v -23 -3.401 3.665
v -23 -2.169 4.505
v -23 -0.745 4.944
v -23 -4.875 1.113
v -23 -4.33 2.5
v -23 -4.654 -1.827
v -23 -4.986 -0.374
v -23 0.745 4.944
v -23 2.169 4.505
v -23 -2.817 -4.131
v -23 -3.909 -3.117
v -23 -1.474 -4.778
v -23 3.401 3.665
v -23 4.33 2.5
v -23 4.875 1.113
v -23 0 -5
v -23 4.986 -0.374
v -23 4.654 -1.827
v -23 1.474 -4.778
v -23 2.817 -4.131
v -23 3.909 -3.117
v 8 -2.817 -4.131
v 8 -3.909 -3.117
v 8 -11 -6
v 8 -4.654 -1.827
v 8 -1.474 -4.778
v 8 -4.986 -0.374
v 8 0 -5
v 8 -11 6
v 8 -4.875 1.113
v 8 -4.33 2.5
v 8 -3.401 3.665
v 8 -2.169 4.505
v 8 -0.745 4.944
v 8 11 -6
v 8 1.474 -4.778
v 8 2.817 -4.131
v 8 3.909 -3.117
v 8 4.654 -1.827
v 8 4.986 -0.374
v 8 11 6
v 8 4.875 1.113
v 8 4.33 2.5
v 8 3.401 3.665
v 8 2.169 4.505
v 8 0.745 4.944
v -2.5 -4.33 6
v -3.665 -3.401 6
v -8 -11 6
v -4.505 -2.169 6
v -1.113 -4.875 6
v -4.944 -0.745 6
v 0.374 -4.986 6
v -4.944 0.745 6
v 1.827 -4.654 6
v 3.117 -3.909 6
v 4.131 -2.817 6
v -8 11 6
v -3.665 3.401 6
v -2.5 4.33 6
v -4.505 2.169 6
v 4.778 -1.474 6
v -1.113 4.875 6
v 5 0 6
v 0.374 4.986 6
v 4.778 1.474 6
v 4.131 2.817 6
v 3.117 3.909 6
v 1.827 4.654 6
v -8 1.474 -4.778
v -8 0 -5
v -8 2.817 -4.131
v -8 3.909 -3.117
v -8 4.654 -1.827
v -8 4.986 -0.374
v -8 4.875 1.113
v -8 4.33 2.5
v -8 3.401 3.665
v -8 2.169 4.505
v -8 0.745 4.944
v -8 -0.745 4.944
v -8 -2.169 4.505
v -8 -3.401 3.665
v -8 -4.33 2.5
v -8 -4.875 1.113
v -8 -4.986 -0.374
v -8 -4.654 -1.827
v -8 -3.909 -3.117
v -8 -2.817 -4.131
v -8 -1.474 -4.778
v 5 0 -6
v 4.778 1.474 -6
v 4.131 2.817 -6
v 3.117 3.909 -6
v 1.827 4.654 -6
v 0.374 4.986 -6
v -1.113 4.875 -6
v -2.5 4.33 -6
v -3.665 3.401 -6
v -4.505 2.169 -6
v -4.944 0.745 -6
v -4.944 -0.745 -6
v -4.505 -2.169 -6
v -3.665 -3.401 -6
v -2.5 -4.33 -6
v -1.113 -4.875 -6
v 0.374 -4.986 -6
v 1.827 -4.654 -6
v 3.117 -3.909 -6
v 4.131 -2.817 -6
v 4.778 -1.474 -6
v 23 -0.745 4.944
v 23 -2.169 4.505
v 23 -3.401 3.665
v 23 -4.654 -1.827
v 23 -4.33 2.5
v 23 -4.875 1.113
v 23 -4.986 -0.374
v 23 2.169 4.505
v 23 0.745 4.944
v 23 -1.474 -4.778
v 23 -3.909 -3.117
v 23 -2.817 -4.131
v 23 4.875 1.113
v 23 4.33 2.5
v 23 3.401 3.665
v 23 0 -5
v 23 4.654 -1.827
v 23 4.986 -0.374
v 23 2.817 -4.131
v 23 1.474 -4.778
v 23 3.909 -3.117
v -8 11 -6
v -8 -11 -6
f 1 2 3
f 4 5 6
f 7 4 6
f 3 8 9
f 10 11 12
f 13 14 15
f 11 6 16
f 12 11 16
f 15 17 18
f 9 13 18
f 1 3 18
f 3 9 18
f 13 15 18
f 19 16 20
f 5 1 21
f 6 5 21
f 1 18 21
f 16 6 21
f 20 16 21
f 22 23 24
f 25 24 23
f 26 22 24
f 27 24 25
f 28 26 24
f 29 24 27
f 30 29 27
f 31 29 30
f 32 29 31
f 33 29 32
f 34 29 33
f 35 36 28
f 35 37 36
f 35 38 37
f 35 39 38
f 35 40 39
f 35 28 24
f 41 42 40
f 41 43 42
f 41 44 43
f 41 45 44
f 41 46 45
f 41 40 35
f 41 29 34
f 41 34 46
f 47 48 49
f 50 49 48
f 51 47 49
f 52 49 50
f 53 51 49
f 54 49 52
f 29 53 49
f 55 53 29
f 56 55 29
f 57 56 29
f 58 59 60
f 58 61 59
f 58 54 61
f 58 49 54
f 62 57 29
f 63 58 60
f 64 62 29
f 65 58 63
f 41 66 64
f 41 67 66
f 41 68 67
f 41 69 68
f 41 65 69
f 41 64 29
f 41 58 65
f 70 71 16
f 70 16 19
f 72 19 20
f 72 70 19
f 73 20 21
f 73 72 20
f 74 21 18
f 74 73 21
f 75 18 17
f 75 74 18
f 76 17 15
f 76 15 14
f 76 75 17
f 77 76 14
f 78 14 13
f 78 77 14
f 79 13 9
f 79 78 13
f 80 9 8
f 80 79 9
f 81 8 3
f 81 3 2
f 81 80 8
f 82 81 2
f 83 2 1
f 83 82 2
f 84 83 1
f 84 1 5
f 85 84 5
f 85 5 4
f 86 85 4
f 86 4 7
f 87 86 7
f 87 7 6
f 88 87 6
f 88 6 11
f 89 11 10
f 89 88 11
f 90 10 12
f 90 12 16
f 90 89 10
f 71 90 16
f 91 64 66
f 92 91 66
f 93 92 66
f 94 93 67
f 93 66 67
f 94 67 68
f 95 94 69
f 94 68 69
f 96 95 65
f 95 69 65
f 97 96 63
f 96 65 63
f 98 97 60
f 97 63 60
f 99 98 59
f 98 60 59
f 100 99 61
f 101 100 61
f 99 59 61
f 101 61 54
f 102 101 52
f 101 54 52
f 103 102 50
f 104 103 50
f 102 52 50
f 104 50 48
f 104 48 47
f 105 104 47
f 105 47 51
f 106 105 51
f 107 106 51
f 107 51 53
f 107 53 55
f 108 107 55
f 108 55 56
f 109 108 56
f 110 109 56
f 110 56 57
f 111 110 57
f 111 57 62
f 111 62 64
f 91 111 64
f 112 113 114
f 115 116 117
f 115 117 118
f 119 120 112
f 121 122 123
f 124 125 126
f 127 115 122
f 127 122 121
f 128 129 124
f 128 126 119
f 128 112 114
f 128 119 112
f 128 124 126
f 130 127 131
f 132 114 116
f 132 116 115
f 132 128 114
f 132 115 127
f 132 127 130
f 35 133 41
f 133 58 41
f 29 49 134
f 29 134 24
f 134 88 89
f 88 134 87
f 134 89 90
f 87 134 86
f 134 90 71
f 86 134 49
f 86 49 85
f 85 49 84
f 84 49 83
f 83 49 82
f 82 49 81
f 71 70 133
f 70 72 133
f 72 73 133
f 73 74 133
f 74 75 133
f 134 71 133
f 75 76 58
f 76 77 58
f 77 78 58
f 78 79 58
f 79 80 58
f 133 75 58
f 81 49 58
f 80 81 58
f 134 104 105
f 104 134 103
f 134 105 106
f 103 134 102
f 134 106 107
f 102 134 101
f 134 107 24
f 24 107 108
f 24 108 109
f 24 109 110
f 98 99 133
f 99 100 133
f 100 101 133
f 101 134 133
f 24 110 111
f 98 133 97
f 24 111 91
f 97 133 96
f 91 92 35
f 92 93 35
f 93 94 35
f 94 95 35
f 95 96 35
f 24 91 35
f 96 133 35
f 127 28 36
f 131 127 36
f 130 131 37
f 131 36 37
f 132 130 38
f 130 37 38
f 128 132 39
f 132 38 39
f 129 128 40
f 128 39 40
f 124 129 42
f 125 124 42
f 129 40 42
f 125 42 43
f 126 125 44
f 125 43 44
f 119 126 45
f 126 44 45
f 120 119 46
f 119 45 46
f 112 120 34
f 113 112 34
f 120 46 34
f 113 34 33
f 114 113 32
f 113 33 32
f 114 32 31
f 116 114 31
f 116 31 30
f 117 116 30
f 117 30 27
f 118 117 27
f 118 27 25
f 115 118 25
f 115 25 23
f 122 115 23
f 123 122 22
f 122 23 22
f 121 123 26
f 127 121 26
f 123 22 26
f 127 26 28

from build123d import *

# Parameters (mm, degrees)
SKETCH_1_W          = 16
SKETCH_1_H          = 22
EXTRUDE_1_DEPTH     = 6
SKETCH_2_R          = 5
EXTRUDE_2_DEPTH     = 15
SKETCH_3_R          = 5
CUT_EXTRUDE_1_DEPTH = 13


with BuildPart() as part:
    # 草图1 → 凸台-拉伸1 (new body, symmetric)
    with BuildSketch(Plane.XY):
        Rectangle(SKETCH_1_W, SKETCH_1_H)
    extrude(amount=EXTRUDE_1_DEPTH, both=True)

    # 草图2 → 凸台-拉伸2 (add)
    with BuildSketch(Plane(origin=(8, 0, 0), x_dir=(0, 0, -1), z_dir=(1, 0, 0))):
        Circle(SKETCH_2_R)
    extrude_2 = extrude(amount=EXTRUDE_2_DEPTH)

    # 镜向1: 凸台-拉伸2 across plane
    add(extrude_2.mirror(Plane(origin=(0, 0, 0), x_dir=(0, 0, 1), z_dir=(1, 0, 0))))

    # 草图3 → 切除-拉伸1 (cut, through all)
    with BuildSketch(Plane.XY.offset(6)):
        Circle(SKETCH_3_R)
    extrude(amount=-CUT_EXTRUDE_1_DEPTH, mode=Mode.SUBTRACT)


solid = part.part
